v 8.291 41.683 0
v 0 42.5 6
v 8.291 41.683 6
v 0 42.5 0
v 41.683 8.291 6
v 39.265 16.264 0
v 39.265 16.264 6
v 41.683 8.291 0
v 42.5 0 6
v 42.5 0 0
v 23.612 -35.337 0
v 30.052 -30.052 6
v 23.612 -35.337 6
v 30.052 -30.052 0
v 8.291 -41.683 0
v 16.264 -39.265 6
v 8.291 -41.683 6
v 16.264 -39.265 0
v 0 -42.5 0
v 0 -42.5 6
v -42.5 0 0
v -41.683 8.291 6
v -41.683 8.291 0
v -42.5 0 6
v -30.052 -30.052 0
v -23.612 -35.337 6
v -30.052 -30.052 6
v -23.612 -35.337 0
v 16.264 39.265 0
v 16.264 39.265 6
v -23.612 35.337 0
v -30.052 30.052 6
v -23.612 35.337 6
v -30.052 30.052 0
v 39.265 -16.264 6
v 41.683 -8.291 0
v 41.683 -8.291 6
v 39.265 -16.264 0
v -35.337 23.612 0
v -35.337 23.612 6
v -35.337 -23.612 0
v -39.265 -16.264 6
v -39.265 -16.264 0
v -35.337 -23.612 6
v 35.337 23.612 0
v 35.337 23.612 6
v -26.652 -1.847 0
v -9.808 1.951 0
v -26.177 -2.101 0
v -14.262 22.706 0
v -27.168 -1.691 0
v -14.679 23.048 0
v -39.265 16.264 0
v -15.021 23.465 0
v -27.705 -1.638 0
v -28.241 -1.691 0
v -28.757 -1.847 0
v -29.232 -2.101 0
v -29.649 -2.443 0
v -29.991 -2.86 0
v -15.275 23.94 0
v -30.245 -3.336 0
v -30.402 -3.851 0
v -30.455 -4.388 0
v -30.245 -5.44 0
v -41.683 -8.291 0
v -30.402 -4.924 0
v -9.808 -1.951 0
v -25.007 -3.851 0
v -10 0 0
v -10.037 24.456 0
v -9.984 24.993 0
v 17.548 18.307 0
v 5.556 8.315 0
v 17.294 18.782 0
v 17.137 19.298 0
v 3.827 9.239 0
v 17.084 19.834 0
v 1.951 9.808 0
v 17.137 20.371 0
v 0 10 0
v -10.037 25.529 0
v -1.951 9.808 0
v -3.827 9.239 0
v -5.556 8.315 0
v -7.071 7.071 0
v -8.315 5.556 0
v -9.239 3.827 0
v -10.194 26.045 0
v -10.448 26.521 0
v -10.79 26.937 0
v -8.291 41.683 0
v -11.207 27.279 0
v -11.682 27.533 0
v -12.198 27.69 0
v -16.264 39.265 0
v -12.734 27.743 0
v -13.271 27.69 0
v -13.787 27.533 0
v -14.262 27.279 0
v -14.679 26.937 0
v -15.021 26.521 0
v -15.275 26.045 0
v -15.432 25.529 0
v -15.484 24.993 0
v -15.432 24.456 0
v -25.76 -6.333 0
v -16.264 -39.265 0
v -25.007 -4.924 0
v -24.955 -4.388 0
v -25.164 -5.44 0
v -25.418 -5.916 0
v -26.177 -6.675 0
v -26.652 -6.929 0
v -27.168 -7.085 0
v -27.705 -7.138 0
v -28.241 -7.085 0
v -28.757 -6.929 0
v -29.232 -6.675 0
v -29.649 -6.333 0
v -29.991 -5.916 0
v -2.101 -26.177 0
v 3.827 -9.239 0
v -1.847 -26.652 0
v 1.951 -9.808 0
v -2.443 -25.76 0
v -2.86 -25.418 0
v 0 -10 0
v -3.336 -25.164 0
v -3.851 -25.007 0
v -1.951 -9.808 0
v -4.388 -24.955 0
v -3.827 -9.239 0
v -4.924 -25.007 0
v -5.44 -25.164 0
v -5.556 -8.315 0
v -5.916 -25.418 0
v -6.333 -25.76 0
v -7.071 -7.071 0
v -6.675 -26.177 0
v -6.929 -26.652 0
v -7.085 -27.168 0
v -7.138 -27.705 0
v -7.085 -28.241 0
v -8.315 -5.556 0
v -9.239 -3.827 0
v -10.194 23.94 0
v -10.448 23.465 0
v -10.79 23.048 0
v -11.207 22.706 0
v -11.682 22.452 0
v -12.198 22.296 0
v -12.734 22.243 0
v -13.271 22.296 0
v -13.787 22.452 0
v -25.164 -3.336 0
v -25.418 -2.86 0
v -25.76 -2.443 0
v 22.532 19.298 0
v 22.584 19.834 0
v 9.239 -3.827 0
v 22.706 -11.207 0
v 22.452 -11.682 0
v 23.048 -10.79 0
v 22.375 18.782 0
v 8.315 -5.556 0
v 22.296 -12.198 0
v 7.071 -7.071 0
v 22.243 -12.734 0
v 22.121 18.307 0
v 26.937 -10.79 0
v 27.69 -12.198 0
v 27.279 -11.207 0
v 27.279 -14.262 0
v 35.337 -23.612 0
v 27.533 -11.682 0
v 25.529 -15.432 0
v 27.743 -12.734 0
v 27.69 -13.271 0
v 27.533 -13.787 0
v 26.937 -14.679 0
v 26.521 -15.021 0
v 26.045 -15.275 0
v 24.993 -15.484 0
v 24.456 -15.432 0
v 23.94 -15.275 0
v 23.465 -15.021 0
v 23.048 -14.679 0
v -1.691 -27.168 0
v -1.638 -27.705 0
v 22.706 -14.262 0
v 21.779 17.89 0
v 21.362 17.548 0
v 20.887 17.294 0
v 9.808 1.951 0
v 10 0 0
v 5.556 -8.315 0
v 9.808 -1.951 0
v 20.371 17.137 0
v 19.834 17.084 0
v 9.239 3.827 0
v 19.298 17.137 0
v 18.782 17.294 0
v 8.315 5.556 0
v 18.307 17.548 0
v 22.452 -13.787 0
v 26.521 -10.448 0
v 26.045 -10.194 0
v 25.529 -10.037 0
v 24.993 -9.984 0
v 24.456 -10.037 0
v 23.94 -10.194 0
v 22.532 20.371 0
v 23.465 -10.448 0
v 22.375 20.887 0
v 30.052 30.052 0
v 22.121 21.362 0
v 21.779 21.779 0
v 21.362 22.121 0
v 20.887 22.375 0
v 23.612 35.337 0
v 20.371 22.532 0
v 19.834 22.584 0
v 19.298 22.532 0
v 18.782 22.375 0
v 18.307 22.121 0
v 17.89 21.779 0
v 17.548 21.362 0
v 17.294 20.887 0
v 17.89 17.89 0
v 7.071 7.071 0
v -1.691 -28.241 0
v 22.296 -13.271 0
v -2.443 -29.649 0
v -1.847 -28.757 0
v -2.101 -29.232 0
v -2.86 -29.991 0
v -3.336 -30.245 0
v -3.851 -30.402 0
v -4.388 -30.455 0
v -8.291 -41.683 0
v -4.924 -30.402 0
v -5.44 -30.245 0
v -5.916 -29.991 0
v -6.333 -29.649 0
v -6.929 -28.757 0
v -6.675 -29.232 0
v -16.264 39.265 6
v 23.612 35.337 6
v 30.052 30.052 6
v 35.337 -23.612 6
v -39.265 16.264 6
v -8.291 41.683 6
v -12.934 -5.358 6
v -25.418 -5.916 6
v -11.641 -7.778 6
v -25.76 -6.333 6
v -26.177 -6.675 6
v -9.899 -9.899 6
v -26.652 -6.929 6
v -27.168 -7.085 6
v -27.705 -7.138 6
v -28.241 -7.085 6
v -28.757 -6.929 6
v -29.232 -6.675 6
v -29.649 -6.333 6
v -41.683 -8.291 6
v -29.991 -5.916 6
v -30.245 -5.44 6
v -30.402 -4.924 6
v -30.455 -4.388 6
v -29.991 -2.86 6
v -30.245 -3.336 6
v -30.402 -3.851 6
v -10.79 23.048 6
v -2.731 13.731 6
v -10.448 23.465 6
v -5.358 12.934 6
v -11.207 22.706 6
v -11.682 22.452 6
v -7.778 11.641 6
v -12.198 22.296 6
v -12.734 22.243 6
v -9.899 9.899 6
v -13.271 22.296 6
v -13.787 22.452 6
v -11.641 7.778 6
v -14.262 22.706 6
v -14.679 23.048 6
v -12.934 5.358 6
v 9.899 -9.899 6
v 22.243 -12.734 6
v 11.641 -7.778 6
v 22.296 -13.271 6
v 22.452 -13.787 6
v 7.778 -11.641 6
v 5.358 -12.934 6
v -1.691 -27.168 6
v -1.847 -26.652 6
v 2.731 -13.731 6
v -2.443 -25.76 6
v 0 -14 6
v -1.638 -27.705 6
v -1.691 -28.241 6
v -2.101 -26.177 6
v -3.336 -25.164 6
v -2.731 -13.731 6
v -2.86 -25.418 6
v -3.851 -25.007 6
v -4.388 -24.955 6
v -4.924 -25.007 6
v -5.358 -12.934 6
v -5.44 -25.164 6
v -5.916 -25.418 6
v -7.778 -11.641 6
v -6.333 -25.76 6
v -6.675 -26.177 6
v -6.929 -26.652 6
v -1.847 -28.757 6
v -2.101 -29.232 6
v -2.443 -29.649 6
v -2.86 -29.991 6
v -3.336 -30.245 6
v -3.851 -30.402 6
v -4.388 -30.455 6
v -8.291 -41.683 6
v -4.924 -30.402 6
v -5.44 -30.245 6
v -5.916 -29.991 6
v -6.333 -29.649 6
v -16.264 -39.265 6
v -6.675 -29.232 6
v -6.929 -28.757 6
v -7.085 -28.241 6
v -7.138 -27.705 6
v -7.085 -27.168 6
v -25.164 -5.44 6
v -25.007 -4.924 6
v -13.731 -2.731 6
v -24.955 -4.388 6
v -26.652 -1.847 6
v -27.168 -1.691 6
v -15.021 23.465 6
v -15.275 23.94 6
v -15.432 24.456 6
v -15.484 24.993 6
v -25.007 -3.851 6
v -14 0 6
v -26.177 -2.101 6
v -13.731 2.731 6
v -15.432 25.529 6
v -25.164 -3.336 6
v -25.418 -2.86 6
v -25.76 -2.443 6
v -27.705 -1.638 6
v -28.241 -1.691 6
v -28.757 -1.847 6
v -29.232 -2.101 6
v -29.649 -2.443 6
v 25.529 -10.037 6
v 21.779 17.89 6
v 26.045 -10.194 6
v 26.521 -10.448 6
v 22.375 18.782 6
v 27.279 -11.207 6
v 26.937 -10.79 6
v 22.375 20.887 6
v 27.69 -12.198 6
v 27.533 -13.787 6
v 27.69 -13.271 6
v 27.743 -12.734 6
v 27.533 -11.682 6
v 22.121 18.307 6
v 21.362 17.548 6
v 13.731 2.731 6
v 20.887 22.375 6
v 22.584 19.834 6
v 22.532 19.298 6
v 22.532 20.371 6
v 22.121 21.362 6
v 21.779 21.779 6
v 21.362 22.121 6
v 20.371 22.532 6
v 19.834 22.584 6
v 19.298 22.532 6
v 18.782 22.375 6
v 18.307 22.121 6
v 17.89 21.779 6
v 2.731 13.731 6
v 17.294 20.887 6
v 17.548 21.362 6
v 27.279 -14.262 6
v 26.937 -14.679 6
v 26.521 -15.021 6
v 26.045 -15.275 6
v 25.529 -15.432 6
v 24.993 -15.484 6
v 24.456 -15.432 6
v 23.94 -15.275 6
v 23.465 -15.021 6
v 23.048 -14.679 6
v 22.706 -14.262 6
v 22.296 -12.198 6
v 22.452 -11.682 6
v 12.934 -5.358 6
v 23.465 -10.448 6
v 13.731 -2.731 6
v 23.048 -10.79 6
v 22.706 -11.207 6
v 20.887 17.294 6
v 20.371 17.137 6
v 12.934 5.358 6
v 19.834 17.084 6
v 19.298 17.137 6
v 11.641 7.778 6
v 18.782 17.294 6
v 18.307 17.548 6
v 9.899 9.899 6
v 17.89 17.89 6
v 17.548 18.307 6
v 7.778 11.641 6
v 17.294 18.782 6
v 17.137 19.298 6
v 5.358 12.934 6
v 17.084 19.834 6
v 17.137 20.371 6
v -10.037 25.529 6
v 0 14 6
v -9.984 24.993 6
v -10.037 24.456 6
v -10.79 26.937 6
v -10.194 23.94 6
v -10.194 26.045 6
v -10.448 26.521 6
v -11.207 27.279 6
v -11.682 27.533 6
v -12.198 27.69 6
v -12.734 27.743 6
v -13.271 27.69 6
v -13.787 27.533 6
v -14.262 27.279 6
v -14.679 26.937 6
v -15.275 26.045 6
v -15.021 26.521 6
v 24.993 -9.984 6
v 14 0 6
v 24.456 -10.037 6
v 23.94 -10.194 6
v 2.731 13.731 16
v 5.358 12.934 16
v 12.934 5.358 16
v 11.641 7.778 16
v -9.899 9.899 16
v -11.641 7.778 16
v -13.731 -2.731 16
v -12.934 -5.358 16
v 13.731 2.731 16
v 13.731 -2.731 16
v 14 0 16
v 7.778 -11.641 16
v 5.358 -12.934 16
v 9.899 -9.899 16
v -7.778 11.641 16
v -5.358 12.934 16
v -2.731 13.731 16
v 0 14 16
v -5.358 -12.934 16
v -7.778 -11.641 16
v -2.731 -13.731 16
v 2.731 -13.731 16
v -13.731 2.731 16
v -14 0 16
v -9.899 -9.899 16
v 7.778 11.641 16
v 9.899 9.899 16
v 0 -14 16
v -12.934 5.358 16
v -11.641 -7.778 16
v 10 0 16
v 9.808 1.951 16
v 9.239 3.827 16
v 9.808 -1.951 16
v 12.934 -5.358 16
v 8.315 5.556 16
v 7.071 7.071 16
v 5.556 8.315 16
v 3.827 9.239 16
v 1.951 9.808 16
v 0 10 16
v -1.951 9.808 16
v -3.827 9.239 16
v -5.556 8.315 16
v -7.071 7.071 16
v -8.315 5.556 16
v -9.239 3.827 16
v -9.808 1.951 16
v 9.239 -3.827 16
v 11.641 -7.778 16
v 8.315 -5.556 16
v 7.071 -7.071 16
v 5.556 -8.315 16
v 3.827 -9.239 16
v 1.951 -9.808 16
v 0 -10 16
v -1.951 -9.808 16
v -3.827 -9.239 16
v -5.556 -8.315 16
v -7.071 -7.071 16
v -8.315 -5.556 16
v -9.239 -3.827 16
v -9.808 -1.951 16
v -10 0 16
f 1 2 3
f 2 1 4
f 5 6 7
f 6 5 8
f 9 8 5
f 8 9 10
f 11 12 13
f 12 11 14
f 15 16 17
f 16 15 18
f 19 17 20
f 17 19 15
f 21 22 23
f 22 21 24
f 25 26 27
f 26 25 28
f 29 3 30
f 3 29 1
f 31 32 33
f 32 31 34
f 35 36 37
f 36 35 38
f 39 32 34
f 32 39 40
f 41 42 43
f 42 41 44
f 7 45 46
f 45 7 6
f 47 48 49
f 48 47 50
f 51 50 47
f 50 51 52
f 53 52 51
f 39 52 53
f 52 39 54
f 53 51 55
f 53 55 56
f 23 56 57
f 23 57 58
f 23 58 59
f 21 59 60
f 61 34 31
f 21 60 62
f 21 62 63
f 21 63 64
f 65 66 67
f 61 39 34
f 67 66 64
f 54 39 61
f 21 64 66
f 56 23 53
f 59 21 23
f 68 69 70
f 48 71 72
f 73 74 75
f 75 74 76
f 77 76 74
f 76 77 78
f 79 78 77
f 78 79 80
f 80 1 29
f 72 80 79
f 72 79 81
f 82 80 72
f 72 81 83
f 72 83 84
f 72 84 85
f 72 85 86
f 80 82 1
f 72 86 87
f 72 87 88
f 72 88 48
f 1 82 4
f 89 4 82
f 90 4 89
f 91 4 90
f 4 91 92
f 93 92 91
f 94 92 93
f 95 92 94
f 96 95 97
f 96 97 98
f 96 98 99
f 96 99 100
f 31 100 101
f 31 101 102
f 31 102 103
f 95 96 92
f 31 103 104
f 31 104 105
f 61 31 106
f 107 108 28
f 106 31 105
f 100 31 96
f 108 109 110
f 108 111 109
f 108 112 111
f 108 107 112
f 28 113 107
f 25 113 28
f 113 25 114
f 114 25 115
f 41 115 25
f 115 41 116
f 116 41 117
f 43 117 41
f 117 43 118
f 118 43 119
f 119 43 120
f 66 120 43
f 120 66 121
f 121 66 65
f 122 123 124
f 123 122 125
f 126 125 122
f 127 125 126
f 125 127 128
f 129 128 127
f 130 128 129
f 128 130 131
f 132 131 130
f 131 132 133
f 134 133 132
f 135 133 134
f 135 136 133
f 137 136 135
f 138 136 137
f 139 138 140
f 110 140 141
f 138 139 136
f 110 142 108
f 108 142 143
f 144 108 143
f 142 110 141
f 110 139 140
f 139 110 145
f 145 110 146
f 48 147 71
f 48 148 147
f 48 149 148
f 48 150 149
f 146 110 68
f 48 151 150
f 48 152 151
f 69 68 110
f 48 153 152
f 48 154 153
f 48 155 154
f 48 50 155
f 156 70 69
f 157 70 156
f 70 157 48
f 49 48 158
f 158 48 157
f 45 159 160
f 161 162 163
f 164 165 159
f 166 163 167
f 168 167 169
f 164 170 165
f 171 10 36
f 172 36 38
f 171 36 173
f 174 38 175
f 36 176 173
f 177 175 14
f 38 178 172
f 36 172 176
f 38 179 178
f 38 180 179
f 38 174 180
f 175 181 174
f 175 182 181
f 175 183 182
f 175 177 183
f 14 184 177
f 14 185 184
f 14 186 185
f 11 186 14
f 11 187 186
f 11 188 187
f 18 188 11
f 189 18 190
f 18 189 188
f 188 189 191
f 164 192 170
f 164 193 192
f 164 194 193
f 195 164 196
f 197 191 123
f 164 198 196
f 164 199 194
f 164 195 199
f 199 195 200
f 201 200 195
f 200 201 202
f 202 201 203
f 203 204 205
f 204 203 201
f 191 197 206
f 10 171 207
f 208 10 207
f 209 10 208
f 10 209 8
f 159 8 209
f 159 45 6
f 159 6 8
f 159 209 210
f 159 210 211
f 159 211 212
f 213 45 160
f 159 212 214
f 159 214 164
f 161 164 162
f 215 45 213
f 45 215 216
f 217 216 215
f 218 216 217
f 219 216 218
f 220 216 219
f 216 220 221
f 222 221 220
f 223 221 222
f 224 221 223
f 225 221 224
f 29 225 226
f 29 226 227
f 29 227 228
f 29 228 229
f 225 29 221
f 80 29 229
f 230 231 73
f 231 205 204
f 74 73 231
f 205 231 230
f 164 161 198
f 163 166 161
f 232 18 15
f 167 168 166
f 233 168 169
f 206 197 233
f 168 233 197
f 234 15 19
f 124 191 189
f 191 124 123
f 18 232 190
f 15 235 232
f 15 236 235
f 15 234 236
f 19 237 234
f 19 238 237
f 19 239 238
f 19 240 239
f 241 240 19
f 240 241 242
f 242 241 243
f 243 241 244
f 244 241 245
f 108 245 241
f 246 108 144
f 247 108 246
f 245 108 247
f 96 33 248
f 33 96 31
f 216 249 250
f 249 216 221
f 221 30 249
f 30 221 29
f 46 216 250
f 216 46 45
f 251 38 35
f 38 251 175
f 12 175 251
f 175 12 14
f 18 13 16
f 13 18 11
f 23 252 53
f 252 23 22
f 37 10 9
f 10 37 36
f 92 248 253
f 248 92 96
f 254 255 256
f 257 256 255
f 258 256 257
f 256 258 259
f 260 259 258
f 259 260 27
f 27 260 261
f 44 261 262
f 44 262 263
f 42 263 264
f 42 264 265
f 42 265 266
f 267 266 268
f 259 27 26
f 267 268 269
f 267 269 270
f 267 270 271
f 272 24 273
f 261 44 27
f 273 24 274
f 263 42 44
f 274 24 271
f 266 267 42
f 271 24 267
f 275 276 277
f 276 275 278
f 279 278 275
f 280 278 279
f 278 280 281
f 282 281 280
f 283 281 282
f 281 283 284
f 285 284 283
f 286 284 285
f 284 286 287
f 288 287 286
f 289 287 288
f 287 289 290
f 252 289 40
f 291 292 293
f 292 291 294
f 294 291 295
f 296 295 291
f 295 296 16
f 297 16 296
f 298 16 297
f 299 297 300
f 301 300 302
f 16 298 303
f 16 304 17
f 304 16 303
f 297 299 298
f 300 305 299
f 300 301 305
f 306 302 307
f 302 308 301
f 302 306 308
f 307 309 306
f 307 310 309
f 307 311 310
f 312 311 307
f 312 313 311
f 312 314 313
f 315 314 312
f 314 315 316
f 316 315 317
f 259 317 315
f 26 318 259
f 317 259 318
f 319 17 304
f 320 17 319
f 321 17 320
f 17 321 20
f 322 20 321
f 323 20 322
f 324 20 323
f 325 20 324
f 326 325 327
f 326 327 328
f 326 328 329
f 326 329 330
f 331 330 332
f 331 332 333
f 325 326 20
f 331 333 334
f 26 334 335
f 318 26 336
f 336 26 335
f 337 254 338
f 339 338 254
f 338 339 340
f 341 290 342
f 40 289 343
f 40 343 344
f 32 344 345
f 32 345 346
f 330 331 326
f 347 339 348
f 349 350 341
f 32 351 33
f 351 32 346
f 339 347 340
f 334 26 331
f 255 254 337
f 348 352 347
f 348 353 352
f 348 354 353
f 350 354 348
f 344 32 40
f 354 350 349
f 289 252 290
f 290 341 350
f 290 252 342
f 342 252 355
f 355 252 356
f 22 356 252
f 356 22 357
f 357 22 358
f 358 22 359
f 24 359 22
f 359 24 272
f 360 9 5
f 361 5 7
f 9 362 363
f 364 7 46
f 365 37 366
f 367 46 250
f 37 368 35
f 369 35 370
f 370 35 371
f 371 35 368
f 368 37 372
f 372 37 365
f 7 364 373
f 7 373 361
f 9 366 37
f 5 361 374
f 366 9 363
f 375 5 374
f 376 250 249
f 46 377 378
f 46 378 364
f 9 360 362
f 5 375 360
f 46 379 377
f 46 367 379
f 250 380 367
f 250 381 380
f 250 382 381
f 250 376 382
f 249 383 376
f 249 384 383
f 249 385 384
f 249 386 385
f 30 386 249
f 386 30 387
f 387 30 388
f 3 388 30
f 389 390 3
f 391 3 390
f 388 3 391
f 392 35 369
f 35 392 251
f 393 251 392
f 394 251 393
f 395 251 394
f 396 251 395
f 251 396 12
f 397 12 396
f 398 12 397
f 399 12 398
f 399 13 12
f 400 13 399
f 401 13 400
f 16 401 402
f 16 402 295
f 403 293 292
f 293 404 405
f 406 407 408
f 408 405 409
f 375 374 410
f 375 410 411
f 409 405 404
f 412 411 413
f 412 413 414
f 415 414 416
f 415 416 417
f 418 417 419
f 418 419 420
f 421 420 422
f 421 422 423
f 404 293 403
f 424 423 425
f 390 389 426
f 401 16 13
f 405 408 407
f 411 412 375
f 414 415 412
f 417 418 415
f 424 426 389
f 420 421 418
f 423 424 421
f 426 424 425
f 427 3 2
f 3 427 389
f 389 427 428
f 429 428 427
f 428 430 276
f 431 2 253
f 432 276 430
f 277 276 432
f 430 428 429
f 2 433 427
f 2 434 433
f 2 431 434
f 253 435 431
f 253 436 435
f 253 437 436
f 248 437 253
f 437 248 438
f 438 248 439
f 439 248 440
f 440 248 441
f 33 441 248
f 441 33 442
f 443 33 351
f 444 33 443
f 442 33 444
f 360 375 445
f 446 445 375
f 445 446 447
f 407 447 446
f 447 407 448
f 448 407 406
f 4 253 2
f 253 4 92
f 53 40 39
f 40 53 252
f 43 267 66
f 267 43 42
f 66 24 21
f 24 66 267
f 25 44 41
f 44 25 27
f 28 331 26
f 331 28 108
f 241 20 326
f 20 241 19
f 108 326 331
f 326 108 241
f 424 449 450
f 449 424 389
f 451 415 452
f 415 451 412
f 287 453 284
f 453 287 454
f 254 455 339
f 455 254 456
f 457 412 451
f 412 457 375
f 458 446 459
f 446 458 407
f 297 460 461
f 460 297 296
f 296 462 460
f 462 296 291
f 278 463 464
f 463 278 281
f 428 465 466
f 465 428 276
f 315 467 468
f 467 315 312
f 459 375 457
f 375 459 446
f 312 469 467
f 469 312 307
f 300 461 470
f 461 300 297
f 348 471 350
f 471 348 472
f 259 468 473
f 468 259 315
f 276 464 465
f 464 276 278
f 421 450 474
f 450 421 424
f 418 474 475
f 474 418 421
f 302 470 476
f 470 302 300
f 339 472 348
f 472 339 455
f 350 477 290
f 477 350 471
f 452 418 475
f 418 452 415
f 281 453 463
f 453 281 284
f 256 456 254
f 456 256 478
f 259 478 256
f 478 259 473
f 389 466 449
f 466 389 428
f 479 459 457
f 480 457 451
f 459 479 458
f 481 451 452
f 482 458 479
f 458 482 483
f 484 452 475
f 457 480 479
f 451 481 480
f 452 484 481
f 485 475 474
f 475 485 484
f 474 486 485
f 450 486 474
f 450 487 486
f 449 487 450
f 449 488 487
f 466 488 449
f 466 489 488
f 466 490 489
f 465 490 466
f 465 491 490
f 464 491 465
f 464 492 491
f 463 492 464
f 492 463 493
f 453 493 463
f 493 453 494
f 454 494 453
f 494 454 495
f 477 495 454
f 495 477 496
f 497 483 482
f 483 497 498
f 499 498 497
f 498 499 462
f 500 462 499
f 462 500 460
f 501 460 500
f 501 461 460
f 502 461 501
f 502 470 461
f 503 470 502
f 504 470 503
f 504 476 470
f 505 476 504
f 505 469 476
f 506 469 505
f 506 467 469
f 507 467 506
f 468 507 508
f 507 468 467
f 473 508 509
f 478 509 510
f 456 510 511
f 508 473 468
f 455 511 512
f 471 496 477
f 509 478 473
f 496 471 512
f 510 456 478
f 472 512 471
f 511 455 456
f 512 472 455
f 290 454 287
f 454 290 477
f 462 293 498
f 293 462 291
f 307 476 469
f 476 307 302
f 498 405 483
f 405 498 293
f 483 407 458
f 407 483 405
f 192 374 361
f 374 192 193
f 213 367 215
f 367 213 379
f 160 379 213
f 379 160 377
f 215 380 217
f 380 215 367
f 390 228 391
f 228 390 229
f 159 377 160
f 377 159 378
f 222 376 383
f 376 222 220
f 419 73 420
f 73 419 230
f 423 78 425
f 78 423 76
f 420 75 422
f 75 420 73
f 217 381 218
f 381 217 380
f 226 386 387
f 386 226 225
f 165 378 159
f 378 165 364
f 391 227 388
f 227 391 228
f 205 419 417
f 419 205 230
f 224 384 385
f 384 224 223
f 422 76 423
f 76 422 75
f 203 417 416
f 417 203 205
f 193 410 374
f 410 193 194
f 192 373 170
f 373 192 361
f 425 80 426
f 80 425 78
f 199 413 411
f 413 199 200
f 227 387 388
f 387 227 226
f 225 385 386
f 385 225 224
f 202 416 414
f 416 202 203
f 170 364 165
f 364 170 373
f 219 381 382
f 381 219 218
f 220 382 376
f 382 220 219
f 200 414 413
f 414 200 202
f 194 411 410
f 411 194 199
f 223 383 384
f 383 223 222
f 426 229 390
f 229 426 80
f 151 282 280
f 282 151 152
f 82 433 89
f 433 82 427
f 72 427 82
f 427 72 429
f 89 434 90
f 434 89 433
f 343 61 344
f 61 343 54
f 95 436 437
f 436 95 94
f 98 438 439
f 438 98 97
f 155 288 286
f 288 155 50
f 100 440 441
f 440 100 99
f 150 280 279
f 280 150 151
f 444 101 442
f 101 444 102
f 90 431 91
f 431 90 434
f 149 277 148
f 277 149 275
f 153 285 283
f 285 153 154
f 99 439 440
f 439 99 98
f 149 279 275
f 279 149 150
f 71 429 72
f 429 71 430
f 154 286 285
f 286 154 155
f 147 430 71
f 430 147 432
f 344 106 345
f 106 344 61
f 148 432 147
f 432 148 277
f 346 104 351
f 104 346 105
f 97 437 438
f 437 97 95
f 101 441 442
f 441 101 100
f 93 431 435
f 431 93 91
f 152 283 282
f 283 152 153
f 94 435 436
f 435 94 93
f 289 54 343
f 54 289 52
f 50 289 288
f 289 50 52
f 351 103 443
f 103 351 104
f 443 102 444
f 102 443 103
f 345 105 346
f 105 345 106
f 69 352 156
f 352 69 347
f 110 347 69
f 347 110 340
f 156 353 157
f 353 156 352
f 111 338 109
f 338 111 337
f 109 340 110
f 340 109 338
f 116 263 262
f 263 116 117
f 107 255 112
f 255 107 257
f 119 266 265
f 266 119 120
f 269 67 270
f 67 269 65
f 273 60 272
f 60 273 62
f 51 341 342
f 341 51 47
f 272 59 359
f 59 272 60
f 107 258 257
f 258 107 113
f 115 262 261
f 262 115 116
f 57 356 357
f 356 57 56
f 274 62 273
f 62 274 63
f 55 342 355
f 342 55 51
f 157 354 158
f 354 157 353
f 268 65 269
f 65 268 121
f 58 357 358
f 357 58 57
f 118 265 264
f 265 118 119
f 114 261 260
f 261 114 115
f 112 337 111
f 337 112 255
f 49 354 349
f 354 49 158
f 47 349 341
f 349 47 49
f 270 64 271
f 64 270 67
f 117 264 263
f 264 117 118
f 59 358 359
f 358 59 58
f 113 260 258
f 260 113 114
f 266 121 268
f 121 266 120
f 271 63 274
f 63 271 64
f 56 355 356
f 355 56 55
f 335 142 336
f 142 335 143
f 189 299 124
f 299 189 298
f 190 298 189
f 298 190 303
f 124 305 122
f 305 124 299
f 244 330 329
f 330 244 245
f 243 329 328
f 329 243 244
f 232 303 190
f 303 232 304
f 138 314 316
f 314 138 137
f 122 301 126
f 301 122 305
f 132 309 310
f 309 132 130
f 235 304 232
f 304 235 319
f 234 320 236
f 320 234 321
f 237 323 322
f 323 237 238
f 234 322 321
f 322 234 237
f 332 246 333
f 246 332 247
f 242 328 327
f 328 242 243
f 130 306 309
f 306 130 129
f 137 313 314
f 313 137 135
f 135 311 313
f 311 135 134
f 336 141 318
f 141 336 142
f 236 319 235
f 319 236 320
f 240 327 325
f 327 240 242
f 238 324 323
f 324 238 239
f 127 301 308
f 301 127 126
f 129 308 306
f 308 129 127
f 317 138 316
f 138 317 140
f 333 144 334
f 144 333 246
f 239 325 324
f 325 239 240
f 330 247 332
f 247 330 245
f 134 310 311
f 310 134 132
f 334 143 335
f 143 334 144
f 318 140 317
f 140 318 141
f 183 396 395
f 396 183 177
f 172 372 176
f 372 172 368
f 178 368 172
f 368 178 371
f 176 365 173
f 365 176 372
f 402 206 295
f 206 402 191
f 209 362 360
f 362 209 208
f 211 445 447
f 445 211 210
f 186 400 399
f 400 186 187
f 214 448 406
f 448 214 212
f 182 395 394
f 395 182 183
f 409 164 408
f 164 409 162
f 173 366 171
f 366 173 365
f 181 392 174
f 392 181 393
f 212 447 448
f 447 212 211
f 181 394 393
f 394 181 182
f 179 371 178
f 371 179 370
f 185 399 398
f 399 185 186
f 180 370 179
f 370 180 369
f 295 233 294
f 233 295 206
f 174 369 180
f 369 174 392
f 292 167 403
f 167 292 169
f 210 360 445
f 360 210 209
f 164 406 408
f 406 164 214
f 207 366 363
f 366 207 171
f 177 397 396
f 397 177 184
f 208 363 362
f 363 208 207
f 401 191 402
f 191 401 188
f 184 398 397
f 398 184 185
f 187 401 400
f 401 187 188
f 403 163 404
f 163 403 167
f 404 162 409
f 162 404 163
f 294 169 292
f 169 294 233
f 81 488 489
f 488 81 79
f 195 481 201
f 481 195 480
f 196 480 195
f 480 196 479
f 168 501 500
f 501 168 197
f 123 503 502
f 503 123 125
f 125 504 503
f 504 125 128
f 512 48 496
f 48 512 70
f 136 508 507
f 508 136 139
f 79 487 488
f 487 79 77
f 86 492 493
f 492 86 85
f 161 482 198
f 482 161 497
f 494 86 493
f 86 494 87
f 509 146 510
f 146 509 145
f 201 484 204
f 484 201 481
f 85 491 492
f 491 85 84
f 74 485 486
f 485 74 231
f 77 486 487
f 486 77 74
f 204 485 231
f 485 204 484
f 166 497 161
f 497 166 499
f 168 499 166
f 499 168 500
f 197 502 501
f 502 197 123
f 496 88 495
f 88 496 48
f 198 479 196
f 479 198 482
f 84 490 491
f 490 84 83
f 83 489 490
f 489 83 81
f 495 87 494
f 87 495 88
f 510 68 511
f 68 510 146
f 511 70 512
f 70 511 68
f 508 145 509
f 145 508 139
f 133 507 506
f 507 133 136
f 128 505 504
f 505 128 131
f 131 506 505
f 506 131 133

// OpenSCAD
$fn = 32;

// ----------------------------------------------------------------------
// Flange Ø85 x 6
// 5 holes on a Ø56.1 bolt circle, bolted joints
// ----------------------------------------------------------------------

// --- parameters (mm) ---
flange_d = 85;   // outside diameter of the flange
thickness = 6;   // flange thickness
holes = 5;       // number of bolt holes
pcd = 56.1;      // bolt circle diameter
start_deg = 45;  // angle of the first hole, from +X
hole_d = 5.5;    // bolt hole diameter
bore_d = 20;     // central through bore
hub_d = 28;      // hub outside diameter
hub_h = 10;      // hub height above the flange face (0 = no hub)

// --- derived feature positions (mm) ---
height = thickness + hub_h;  // = 16   overall height of the part
pcd_r = pcd / 2;             // = 28.05   bolt circle radius
hole_step = 360 / holes;     // = 72   angular pitch
feature_centers = [
  [pcd_r * cos(start_deg + 0 * hole_step), pcd_r * sin(start_deg + 0 * hole_step)],
  [pcd_r * cos(start_deg + 1 * hole_step), pcd_r * sin(start_deg + 1 * hole_step)],
  [pcd_r * cos(start_deg + 2 * hole_step), pcd_r * sin(start_deg + 2 * hole_step)],
  [pcd_r * cos(start_deg + 3 * hole_step), pcd_r * sin(start_deg + 3 * hole_step)],
  [pcd_r * cos(start_deg + 4 * hole_step), pcd_r * sin(start_deg + 4 * hole_step)]
];   // bolt hole centres on the pitch circle

// flange disc, every hole and the bore cut straight through
difference() {
  union() {
    cylinder(d = flange_d, h = thickness);
    cylinder(d = hub_d, h = height);  // hub, overlapped into the flange
  }
  translate([0, 0, -1]) cylinder(d = bore_d, h = height + 2);  // bore, through
  for (centre = feature_centers)
    translate([centre[0], centre[1], -1]) cylinder(d = hole_d, h = thickness + 2);
}
